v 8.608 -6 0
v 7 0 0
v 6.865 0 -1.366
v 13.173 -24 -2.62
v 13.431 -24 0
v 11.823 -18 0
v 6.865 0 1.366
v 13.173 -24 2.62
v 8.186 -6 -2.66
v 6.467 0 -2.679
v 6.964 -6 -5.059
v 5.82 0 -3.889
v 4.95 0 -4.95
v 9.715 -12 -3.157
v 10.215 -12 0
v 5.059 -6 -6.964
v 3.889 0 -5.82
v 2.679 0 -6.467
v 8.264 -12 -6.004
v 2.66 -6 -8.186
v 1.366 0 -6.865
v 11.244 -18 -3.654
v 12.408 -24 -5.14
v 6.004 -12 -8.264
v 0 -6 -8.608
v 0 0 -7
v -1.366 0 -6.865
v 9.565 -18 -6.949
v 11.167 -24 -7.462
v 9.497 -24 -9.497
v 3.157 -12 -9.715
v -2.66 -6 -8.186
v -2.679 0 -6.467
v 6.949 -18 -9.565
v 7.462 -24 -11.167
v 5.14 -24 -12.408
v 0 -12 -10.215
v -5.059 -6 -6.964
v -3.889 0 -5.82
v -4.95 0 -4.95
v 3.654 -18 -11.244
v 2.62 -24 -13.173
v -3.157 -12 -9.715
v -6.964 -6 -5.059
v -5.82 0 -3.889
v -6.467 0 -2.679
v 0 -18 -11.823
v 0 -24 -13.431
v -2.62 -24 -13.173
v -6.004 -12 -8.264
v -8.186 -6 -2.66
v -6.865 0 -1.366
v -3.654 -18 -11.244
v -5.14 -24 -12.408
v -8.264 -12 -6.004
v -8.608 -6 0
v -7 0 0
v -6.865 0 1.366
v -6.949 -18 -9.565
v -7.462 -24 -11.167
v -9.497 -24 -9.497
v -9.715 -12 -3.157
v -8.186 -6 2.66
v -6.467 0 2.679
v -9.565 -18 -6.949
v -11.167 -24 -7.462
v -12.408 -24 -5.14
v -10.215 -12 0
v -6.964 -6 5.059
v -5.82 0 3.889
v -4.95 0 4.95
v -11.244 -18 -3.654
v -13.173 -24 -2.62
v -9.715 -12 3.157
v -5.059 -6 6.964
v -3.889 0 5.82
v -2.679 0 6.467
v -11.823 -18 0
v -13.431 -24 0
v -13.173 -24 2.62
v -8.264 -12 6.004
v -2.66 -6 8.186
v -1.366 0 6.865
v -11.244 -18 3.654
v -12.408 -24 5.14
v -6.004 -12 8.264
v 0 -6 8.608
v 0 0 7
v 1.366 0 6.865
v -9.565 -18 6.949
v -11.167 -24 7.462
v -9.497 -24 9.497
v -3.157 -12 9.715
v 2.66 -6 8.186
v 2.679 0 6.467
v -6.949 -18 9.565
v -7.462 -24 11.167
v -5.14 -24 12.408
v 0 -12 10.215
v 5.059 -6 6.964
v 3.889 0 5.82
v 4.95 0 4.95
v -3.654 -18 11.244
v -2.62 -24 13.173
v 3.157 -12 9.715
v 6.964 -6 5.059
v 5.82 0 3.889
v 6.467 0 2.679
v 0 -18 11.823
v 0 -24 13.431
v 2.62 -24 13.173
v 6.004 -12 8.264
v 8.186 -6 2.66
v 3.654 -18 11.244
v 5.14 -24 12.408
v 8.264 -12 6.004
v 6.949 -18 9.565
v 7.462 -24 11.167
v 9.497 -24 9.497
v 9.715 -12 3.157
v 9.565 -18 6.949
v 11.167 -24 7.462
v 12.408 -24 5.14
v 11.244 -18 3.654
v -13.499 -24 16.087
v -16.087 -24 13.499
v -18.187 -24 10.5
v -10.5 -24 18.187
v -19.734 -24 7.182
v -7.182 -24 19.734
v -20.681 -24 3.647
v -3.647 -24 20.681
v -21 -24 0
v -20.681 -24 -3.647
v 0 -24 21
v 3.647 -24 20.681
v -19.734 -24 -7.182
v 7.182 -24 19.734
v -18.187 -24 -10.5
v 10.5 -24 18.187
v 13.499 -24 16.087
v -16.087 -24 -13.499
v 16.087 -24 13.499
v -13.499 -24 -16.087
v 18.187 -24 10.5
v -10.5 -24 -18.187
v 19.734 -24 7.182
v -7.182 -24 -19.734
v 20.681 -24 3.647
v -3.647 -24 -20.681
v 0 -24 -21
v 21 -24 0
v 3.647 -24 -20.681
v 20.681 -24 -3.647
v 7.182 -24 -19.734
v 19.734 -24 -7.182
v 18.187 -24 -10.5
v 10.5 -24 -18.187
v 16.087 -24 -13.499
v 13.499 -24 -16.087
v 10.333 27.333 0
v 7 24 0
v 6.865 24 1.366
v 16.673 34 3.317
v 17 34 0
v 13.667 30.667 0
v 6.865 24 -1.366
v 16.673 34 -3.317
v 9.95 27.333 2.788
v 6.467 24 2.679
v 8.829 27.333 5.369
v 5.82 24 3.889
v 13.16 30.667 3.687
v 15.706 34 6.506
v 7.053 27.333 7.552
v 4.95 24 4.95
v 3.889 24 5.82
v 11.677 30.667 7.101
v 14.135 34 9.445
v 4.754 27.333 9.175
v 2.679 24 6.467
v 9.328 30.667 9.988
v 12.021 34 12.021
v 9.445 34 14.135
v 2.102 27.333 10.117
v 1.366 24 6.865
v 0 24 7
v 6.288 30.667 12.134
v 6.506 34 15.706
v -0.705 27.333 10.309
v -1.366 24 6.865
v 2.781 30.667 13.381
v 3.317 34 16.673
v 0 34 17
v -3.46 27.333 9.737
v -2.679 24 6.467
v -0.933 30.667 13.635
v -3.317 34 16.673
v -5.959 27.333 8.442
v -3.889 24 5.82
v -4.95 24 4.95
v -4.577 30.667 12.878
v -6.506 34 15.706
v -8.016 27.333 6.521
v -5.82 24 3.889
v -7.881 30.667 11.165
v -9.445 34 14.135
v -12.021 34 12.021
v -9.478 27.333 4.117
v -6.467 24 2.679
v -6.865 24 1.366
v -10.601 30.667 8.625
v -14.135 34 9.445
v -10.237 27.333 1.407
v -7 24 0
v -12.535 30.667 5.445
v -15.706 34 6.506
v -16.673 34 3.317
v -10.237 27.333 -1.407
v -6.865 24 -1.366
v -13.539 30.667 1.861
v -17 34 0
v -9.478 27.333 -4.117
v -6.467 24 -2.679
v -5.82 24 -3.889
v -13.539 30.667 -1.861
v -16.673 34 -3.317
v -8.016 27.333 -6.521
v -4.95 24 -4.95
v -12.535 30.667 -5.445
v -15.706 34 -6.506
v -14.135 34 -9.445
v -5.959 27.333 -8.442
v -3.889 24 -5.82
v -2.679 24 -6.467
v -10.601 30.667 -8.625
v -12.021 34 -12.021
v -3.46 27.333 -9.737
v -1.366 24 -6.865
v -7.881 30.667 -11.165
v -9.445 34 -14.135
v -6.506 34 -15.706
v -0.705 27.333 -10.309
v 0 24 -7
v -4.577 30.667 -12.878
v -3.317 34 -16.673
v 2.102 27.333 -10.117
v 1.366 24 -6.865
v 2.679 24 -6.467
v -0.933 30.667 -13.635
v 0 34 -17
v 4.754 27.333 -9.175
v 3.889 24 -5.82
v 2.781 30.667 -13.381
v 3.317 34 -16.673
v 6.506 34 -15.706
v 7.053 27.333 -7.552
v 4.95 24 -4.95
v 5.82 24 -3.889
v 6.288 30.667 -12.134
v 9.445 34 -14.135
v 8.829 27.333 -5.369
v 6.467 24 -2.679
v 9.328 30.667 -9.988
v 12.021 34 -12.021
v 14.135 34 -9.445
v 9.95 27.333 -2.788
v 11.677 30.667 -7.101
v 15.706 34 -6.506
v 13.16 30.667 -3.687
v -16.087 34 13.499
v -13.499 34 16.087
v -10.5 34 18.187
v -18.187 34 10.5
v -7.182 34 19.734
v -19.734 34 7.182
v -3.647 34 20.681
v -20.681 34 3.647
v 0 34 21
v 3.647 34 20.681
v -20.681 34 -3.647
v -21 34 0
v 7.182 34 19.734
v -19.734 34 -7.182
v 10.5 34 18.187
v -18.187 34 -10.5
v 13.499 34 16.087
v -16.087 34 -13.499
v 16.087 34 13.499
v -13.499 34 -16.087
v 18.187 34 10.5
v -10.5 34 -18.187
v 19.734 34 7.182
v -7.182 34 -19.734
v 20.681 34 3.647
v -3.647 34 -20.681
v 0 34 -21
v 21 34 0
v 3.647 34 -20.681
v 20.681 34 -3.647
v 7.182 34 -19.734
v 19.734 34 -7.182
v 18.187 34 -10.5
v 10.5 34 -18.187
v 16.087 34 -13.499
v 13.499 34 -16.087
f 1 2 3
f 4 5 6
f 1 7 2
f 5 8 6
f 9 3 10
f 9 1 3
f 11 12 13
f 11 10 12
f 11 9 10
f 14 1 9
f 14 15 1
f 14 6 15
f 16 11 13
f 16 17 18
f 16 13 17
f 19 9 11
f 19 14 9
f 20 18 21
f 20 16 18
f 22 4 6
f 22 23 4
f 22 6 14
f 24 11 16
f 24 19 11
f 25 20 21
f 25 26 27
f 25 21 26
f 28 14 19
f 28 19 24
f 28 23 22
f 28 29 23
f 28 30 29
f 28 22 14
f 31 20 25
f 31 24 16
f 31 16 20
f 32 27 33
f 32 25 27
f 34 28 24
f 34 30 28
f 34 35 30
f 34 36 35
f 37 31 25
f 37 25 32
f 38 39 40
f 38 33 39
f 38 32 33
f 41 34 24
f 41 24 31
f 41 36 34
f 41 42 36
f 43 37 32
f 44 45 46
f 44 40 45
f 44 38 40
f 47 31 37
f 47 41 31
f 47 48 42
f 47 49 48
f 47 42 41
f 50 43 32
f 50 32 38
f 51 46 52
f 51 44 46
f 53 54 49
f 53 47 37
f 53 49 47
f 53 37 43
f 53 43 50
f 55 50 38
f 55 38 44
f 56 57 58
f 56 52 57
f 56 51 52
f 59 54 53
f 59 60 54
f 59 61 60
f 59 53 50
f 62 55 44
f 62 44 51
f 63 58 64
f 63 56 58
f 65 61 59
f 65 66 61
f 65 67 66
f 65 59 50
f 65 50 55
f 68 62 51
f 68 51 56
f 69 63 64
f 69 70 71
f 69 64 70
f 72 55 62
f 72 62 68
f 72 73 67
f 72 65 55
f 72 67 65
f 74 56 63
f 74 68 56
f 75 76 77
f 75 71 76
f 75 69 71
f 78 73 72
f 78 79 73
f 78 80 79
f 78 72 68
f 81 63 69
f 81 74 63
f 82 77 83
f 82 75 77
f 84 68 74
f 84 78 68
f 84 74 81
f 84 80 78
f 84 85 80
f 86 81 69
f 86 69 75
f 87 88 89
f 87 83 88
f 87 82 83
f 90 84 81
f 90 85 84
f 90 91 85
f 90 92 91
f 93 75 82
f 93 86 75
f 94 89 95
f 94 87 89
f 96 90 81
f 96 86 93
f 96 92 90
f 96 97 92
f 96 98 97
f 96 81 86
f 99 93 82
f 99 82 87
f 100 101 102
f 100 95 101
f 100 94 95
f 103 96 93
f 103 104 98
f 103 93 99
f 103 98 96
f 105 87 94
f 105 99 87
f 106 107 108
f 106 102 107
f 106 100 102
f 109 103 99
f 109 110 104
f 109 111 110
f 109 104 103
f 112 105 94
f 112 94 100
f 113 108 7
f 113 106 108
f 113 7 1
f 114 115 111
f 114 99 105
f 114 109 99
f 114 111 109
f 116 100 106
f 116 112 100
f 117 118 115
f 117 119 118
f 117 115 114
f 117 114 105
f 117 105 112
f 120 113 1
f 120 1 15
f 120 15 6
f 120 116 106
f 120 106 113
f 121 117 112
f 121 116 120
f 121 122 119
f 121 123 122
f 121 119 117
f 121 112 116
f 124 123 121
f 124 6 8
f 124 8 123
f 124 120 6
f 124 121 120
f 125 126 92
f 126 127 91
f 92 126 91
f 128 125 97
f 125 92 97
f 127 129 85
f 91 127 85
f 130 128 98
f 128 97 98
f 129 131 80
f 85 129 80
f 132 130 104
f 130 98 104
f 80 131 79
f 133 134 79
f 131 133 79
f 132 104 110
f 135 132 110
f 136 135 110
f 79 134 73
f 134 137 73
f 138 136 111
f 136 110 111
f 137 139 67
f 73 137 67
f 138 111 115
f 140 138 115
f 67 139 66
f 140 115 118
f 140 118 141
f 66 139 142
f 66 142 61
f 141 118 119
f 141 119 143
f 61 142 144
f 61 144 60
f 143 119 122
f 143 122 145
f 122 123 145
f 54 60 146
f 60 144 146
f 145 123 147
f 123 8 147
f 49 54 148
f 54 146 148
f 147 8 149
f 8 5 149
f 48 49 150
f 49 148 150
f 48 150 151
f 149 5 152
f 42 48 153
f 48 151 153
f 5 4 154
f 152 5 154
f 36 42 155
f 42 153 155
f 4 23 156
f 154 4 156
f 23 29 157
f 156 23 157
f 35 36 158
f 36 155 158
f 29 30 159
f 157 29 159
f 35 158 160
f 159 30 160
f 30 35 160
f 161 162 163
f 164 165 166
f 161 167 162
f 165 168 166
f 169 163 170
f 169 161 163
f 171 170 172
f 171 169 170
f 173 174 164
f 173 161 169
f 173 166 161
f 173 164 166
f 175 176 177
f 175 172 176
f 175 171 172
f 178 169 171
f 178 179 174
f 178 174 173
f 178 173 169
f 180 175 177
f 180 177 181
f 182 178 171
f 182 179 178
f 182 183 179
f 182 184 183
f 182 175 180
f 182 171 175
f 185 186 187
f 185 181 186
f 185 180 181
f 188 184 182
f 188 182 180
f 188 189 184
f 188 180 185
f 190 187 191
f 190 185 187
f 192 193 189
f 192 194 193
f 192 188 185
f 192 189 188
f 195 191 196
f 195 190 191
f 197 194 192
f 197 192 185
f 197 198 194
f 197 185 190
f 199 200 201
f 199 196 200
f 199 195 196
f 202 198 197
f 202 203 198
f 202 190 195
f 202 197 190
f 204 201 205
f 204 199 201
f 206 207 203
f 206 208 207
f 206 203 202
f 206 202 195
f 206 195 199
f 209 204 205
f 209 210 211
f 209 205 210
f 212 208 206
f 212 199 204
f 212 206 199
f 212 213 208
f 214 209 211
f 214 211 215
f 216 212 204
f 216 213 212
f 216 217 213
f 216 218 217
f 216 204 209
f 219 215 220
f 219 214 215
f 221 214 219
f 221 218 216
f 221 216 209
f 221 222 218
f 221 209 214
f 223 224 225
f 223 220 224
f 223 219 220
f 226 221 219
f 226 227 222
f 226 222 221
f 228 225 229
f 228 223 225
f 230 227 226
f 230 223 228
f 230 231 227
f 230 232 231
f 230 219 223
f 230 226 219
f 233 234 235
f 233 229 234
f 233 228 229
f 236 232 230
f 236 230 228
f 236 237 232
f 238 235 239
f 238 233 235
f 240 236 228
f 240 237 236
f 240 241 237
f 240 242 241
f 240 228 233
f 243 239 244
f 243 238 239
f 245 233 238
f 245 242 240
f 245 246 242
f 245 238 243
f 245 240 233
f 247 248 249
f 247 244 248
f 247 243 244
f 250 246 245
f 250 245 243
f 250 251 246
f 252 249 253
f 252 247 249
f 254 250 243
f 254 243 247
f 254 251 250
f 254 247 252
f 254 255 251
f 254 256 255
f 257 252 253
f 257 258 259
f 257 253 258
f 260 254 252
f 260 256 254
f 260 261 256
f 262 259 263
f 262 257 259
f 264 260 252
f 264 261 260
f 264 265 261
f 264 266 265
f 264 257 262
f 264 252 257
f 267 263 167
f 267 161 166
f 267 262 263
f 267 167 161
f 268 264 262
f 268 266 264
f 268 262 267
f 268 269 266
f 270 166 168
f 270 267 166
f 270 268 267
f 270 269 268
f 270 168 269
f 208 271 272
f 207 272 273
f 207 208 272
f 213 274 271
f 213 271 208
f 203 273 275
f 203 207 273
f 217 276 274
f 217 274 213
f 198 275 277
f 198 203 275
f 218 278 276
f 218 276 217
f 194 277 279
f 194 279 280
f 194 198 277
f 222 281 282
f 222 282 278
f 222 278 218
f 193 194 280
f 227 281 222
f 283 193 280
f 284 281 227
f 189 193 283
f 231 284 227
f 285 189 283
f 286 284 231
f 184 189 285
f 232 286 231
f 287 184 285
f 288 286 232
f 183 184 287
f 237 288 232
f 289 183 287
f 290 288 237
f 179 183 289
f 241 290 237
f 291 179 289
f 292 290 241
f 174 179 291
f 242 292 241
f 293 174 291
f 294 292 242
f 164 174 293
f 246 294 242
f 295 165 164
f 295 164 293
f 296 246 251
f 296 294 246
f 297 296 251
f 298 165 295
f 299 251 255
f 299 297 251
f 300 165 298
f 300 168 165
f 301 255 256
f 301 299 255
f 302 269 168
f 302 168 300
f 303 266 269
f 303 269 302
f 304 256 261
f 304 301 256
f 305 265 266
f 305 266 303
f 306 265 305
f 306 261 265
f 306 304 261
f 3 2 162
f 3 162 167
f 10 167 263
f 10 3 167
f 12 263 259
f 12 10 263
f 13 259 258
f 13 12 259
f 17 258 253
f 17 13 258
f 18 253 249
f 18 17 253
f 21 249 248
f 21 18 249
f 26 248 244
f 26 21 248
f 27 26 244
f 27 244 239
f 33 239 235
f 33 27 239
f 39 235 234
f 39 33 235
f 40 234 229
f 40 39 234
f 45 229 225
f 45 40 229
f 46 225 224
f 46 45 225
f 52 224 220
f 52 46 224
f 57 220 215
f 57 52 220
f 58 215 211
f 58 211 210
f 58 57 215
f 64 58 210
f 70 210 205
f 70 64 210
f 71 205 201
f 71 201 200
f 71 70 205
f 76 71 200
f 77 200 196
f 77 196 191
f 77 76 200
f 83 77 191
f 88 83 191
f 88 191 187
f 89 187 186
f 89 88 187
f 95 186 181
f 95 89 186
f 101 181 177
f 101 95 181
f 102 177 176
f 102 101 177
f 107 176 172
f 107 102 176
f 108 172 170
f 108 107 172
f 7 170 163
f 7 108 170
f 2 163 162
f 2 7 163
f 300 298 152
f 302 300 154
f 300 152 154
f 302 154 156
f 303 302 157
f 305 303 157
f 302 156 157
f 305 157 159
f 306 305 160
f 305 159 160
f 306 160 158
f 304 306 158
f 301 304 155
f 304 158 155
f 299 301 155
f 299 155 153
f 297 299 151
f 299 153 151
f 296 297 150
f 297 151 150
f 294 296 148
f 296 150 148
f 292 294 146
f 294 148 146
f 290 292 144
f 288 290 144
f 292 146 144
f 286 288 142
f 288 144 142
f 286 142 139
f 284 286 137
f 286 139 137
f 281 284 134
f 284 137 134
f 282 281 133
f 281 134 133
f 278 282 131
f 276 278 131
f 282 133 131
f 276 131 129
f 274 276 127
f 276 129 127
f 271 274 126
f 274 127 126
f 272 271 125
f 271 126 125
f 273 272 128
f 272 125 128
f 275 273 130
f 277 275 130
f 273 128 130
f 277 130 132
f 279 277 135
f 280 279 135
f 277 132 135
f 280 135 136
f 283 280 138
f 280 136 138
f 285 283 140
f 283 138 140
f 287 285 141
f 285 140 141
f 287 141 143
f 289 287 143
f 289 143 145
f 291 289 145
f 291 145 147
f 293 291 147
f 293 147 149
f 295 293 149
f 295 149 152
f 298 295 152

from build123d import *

# Parameters (mm, degrees)
SKETCH1_R                    = 21
BOSS_EXTRUDE1_DEPTH          = 24
BOSS_EXTRUDE1_DEPTH_BACK     = 24
SKETCH3_R                    = 7
CUT_EXTRUDE1_DEPTH           = 24
CUT_EXTRUDE1_TAPER           = -15
CUT_EXTRUDE1_OTHER_WAY_DEPTH = 24
SKETCH4_R                    = 21
BOSS_EXTRUDE2_DEPTH          = 10
SKETCH5_R                    = 7
CUT_EXTRUDE2_DEPTH           = 10
CUT_EXTRUDE2_TAPER           = -45


with BuildPart() as part:
    # Sketch1 → Boss-Extrude1 (new body, two sides)
    with BuildSketch(Plane(origin=(0, 0, 0), x_dir=(1, 0, 0), z_dir=(0, 1, 0))) as boss_extrude1_sk:
        Circle(SKETCH1_R)
    extrude(amount=BOSS_EXTRUDE1_DEPTH)
    extrude(boss_extrude1_sk.sketch, amount=-BOSS_EXTRUDE1_DEPTH_BACK)

    # Sketch3 → Cut-Extrude1 (cut)
    with BuildSketch(Plane(origin=(0, 0, 0), x_dir=(1, 0, 0), z_dir=(0, 1, 0))):
        Circle(SKETCH3_R)
    extrude(amount=-CUT_EXTRUDE1_DEPTH, taper=CUT_EXTRUDE1_TAPER, mode=Mode.SUBTRACT)

    # Sketch3 → Cut-Extrude1 other way (cut)
    with BuildSketch(Plane(origin=(0, 0, 0), x_dir=(1, 0, 0), z_dir=(0, 1, 0))):
        Circle(SKETCH3_R)
    extrude(amount=CUT_EXTRUDE1_OTHER_WAY_DEPTH, mode=Mode.SUBTRACT)

    # Sketch4 → Boss-Extrude2 (add)
    with BuildSketch(Plane(origin=(0, 24, 0), x_dir=(1, 0, 0), z_dir=(0, 1, 0))):
        Circle(SKETCH4_R)
    extrude(amount=BOSS_EXTRUDE2_DEPTH)

    # Sketch5 → Cut-Extrude2 (cut)
    with BuildSketch(Plane.XZ.offset(-24)):
        Circle(SKETCH5_R)
    extrude(amount=-CUT_EXTRUDE2_DEPTH, taper=CUT_EXTRUDE2_TAPER, mode=Mode.SUBTRACT)


solid = part.part
